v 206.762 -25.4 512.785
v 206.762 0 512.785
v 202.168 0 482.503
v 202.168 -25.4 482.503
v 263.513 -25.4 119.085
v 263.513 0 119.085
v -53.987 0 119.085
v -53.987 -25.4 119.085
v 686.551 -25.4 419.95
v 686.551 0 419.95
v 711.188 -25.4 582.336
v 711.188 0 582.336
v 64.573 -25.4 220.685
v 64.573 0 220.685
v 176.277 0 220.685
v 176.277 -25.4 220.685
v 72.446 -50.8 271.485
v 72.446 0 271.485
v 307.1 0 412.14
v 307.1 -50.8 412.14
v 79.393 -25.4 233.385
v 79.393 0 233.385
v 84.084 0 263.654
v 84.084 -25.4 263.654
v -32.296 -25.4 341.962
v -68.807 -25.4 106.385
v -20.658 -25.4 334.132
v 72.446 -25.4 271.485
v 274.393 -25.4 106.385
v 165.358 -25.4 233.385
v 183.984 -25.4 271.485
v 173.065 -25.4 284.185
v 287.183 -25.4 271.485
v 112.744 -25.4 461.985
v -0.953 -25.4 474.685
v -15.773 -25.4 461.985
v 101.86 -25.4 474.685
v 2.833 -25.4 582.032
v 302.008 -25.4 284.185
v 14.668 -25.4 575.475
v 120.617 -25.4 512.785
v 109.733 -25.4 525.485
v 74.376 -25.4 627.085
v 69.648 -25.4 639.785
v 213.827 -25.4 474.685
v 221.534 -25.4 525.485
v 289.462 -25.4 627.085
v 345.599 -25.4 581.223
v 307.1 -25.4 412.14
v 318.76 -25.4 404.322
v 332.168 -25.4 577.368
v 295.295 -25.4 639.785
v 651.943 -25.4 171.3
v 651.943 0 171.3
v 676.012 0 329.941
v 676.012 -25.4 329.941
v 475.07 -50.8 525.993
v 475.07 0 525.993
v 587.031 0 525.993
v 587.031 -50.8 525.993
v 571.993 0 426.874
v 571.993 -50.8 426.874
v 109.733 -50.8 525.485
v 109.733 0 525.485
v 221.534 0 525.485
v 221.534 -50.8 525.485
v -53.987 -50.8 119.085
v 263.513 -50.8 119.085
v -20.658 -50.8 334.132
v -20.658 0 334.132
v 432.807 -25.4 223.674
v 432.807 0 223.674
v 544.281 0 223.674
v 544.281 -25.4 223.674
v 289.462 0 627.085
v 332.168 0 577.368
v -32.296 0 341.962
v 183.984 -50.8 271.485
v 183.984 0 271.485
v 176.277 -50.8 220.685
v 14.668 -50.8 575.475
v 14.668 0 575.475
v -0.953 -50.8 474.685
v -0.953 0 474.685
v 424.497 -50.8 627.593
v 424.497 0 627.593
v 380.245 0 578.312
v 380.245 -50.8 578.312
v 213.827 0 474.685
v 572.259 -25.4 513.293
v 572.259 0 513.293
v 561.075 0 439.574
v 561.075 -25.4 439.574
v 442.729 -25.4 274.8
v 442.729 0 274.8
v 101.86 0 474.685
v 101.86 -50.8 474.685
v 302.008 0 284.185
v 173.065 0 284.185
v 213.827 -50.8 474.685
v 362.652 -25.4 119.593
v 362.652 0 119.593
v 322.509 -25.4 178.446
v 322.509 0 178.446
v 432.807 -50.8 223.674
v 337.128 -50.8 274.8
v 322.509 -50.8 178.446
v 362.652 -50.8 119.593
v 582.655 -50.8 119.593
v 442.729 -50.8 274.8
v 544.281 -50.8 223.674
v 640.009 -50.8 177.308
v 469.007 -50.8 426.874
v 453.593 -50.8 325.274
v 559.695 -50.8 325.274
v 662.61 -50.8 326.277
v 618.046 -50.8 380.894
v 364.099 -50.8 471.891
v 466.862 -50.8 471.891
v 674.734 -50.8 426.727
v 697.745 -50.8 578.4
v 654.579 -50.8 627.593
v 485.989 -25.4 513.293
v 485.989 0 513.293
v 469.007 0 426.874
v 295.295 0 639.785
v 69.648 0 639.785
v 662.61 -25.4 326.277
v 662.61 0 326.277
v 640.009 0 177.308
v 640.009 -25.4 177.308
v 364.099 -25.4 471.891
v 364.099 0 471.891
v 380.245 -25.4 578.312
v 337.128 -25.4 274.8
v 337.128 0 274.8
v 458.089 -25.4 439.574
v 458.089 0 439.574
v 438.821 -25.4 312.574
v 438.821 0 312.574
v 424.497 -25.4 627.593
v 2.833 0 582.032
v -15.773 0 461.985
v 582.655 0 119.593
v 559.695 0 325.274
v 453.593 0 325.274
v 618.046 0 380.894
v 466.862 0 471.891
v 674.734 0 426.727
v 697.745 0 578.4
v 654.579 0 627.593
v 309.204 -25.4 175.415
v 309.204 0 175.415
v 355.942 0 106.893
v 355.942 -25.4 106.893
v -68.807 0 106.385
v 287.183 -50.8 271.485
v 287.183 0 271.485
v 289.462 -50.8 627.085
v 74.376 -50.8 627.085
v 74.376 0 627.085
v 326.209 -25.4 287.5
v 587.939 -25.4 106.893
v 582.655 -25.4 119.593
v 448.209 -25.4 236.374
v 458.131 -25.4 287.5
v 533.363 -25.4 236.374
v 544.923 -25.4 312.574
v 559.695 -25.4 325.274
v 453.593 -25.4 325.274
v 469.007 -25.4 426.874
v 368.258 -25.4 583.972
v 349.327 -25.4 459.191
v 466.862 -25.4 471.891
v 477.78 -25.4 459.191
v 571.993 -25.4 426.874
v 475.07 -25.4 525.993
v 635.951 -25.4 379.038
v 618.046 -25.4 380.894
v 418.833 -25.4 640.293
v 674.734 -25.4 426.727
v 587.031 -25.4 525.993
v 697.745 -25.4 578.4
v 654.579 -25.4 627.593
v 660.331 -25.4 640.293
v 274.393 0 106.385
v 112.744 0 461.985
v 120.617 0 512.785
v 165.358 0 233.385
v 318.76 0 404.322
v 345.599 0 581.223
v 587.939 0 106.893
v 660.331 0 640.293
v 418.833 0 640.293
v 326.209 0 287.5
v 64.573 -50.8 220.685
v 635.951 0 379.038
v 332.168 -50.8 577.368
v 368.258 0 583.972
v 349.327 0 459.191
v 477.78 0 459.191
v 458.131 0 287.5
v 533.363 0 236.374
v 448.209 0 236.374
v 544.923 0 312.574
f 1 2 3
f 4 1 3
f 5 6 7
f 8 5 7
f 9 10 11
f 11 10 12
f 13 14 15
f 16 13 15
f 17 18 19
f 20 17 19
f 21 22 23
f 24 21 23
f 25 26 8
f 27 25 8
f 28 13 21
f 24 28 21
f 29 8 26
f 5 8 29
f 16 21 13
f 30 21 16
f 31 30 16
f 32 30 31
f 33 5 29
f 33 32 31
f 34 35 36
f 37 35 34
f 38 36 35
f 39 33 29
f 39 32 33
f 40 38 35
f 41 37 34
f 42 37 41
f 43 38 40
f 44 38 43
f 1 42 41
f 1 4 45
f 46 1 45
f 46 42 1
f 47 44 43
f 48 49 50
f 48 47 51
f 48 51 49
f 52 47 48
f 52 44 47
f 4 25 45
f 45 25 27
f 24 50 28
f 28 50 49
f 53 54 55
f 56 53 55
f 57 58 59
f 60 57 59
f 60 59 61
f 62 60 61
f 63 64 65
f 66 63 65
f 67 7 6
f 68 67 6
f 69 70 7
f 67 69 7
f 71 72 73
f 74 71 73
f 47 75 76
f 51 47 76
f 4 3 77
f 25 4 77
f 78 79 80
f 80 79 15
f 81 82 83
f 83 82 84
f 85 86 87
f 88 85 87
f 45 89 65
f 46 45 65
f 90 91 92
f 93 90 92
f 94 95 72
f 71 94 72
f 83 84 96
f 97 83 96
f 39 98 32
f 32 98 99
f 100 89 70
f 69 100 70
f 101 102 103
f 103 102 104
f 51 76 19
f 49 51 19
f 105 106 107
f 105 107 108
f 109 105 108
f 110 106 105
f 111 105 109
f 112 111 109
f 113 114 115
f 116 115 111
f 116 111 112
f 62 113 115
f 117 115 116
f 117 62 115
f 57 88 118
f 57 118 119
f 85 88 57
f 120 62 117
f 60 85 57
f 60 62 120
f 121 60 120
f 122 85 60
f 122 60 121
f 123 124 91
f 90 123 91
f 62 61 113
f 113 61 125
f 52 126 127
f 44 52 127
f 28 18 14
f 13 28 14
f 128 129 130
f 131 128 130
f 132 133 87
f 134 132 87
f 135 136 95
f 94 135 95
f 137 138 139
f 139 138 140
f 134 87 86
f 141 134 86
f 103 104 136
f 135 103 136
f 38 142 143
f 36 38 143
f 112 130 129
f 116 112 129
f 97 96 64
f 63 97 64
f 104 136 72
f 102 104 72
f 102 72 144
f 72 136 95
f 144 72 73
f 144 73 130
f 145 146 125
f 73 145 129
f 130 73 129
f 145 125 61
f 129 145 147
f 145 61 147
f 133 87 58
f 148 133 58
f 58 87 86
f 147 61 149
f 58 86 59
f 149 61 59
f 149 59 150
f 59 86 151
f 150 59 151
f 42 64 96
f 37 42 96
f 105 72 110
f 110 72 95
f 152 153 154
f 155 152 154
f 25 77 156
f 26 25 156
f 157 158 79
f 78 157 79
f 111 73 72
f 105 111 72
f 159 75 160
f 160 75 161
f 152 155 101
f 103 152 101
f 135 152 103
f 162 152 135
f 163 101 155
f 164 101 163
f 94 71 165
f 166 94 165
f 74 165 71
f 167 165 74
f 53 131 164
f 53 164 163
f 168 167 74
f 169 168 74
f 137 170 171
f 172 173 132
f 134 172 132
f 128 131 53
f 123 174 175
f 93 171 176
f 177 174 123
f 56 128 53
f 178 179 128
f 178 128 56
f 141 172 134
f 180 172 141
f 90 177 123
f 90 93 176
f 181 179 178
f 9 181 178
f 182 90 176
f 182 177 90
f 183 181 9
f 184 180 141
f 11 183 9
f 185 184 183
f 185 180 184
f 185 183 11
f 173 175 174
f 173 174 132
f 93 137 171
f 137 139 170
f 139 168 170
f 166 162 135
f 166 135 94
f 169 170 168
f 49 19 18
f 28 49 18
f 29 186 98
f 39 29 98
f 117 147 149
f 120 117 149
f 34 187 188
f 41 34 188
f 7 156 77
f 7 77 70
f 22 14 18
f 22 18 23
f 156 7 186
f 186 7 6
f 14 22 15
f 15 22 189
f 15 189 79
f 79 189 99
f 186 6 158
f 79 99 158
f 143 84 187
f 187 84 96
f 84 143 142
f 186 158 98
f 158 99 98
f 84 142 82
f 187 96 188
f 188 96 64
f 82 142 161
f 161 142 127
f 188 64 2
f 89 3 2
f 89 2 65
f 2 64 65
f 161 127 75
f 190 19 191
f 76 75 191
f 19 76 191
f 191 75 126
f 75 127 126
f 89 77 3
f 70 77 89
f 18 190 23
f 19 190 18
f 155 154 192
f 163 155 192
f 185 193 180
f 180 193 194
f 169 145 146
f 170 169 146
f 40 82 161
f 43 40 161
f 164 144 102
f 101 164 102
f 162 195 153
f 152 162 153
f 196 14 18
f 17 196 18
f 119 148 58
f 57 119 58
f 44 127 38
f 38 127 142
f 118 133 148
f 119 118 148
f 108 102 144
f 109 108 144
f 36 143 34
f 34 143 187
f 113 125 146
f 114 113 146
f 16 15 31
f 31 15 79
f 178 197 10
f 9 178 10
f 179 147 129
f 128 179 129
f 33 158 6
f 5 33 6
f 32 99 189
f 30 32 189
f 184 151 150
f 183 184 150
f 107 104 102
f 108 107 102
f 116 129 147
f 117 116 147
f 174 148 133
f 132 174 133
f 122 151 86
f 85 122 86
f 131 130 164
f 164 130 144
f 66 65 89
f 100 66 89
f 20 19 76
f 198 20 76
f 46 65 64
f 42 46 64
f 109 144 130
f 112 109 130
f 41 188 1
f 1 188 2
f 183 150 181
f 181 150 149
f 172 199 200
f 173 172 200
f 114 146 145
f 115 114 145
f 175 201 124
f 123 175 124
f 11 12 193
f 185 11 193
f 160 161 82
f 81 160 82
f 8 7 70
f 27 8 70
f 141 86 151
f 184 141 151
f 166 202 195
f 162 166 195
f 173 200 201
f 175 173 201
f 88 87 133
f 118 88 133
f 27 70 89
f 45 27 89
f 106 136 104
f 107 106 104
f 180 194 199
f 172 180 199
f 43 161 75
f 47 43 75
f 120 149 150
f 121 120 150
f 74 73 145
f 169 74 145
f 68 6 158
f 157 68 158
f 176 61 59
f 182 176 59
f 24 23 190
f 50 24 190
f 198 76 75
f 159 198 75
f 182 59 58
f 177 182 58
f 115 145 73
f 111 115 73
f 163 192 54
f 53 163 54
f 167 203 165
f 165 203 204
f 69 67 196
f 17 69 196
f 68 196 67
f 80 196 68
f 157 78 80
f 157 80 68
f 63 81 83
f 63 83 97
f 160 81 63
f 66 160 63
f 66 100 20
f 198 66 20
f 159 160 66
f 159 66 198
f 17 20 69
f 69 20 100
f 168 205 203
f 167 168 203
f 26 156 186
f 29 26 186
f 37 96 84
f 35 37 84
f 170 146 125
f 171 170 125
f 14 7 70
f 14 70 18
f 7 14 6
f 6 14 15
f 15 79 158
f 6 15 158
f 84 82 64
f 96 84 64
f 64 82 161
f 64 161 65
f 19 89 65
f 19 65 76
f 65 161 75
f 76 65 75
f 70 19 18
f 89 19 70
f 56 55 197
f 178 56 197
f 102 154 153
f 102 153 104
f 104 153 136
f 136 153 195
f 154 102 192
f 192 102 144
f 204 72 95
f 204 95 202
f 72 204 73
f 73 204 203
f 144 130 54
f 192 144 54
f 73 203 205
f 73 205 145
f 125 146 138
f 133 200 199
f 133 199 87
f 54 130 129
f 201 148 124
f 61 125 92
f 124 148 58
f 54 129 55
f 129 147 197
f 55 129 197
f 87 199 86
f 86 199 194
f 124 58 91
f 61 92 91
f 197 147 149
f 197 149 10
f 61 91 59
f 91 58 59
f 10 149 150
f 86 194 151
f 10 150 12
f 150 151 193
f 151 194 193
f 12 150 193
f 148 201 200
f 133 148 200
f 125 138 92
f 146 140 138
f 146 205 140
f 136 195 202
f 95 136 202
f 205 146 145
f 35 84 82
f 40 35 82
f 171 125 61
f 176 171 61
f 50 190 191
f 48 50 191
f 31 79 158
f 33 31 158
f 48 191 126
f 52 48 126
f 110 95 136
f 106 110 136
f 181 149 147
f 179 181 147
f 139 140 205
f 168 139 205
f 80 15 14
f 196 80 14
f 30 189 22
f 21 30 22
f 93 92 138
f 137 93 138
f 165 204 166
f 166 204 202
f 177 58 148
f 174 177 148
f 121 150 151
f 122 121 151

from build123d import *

# Parameters (mm, degrees)
F1_DEPTH = 25.4
F2_DEPTH = 50.8


with BuildPart() as f1:
    # F0 (on Front) → F1 (new body)
    with BuildSketch(Plane.XZ):
        Polygon((112.743549, 461.984992), (120.616771, 512.784992), (206.761961, 512.784992), (202.167697, 482.503099), (-32.295774, 341.962492), (-68.806682, 106.384992), (274.393014, 106.384992), (302.008014, 284.184992), (173.065308, 284.184992), (165.358108, 233.384992), (79.392611, 233.384992), (84.083868, 263.654159), (318.759659, 404.322033), (345.598504, 581.223302), (295.294644, 639.784992), (69.648293, 639.784992), (2.832766, 582.032024), (-15.772687, 461.984992), align=None)
        Polygon((263.513248, 119.084992), (-53.986752, 119.084992), (-20.657809, 334.131658), (213.826893, 474.684992), (221.534093, 525.484992), (109.733453, 525.484992), (101.860231, 474.684992), (-0.952758, 474.684992), (14.668222, 575.475452), (74.376298, 627.084992), (289.461649, 627.084992), (332.168222, 577.367753), (307.100463, 412.14014), (72.445904, 271.484992), (64.572681, 220.684992), (176.276641, 220.684992), (183.98384, 271.484992), (287.183247, 271.484992), align=None, mode=Mode.SUBTRACT)
        Polygon((326.20924, 287.499707), (309.204088, 175.414667), (355.941931, 106.893002), (587.939145, 106.893002), (651.943133, 171.299923), (676.011597, 329.940943), (635.951093, 379.038421), (686.550848, 419.94955), (711.187572, 582.336115), (660.33141, 640.293002), (418.832756, 640.293002), (368.258426, 583.971529), (349.327158, 459.190996), (477.780479, 459.190996), (485.988647, 513.293002), (572.25927, 513.293002), (561.07482, 439.573605), (458.088912, 439.573605), (438.820914, 312.573605), (544.923363, 312.573605), (533.362564, 236.373605), (448.208969, 236.373605), (458.130843, 287.499707), align=None)
        Polygon((364.09929, 471.890996), (380.245102, 578.311922), (424.497454, 627.593002), (654.579304, 627.593002), (697.745102, 578.400236), (674.733756, 426.726927), (618.046191, 380.893656), (662.610324, 326.276606), (640.009347, 177.308145), (582.655273, 119.593002), (362.652413, 119.593002), (322.509347, 178.44616), (337.127772, 274.799707), (442.729253, 274.799707), (432.80738, 223.673605), (544.281097, 223.673605), (559.695495, 325.273605), (453.593046, 325.273605), (469.007444, 426.873605), (571.993352, 426.873605), (587.031402, 525.993002), (475.070115, 525.993002), (466.861947, 471.890996), align=None, mode=Mode.SUBTRACT)
    extrude(amount=F1_DEPTH)


with BuildPart() as f2:
    # F0 (on Front) → F2 (new body)
    with BuildSketch(Plane.XZ):
        Polygon((424.497454, 627.593002), (380.245102, 578.311922), (364.09929, 471.890996), (466.861947, 471.890996), (475.070115, 525.993002), (587.031402, 525.993002), (571.993352, 426.873605), (469.007444, 426.873605), (453.593046, 325.273605), (559.695495, 325.273605), (544.281097, 223.673605), (432.80738, 223.673605), (442.729253, 274.799707), (337.127772, 274.799707), (322.509347, 178.44616), (362.652413, 119.593002), (582.655273, 119.593002), (640.009347, 177.308145), (662.610324, 326.276606), (618.046191, 380.893656), (674.733756, 426.726927), (697.745102, 578.400236), (654.579304, 627.593002), align=None)
        Polygon((-20.657809, 334.131658), (-53.986752, 119.084992), (263.513248, 119.084992), (287.183247, 271.484992), (183.98384, 271.484992), (176.276641, 220.684992), (64.572681, 220.684992), (72.445904, 271.484992), (307.100463, 412.14014), (332.168222, 577.367753), (289.461649, 627.084992), (74.376298, 627.084992), (14.668222, 575.475452), (-0.952758, 474.684992), (101.860231, 474.684992), (109.733453, 525.484992), (221.534093, 525.484992), (213.826893, 474.684992), align=None)
    extrude(amount=F2_DEPTH)


solid = Compound([f1.part, f2.part])
